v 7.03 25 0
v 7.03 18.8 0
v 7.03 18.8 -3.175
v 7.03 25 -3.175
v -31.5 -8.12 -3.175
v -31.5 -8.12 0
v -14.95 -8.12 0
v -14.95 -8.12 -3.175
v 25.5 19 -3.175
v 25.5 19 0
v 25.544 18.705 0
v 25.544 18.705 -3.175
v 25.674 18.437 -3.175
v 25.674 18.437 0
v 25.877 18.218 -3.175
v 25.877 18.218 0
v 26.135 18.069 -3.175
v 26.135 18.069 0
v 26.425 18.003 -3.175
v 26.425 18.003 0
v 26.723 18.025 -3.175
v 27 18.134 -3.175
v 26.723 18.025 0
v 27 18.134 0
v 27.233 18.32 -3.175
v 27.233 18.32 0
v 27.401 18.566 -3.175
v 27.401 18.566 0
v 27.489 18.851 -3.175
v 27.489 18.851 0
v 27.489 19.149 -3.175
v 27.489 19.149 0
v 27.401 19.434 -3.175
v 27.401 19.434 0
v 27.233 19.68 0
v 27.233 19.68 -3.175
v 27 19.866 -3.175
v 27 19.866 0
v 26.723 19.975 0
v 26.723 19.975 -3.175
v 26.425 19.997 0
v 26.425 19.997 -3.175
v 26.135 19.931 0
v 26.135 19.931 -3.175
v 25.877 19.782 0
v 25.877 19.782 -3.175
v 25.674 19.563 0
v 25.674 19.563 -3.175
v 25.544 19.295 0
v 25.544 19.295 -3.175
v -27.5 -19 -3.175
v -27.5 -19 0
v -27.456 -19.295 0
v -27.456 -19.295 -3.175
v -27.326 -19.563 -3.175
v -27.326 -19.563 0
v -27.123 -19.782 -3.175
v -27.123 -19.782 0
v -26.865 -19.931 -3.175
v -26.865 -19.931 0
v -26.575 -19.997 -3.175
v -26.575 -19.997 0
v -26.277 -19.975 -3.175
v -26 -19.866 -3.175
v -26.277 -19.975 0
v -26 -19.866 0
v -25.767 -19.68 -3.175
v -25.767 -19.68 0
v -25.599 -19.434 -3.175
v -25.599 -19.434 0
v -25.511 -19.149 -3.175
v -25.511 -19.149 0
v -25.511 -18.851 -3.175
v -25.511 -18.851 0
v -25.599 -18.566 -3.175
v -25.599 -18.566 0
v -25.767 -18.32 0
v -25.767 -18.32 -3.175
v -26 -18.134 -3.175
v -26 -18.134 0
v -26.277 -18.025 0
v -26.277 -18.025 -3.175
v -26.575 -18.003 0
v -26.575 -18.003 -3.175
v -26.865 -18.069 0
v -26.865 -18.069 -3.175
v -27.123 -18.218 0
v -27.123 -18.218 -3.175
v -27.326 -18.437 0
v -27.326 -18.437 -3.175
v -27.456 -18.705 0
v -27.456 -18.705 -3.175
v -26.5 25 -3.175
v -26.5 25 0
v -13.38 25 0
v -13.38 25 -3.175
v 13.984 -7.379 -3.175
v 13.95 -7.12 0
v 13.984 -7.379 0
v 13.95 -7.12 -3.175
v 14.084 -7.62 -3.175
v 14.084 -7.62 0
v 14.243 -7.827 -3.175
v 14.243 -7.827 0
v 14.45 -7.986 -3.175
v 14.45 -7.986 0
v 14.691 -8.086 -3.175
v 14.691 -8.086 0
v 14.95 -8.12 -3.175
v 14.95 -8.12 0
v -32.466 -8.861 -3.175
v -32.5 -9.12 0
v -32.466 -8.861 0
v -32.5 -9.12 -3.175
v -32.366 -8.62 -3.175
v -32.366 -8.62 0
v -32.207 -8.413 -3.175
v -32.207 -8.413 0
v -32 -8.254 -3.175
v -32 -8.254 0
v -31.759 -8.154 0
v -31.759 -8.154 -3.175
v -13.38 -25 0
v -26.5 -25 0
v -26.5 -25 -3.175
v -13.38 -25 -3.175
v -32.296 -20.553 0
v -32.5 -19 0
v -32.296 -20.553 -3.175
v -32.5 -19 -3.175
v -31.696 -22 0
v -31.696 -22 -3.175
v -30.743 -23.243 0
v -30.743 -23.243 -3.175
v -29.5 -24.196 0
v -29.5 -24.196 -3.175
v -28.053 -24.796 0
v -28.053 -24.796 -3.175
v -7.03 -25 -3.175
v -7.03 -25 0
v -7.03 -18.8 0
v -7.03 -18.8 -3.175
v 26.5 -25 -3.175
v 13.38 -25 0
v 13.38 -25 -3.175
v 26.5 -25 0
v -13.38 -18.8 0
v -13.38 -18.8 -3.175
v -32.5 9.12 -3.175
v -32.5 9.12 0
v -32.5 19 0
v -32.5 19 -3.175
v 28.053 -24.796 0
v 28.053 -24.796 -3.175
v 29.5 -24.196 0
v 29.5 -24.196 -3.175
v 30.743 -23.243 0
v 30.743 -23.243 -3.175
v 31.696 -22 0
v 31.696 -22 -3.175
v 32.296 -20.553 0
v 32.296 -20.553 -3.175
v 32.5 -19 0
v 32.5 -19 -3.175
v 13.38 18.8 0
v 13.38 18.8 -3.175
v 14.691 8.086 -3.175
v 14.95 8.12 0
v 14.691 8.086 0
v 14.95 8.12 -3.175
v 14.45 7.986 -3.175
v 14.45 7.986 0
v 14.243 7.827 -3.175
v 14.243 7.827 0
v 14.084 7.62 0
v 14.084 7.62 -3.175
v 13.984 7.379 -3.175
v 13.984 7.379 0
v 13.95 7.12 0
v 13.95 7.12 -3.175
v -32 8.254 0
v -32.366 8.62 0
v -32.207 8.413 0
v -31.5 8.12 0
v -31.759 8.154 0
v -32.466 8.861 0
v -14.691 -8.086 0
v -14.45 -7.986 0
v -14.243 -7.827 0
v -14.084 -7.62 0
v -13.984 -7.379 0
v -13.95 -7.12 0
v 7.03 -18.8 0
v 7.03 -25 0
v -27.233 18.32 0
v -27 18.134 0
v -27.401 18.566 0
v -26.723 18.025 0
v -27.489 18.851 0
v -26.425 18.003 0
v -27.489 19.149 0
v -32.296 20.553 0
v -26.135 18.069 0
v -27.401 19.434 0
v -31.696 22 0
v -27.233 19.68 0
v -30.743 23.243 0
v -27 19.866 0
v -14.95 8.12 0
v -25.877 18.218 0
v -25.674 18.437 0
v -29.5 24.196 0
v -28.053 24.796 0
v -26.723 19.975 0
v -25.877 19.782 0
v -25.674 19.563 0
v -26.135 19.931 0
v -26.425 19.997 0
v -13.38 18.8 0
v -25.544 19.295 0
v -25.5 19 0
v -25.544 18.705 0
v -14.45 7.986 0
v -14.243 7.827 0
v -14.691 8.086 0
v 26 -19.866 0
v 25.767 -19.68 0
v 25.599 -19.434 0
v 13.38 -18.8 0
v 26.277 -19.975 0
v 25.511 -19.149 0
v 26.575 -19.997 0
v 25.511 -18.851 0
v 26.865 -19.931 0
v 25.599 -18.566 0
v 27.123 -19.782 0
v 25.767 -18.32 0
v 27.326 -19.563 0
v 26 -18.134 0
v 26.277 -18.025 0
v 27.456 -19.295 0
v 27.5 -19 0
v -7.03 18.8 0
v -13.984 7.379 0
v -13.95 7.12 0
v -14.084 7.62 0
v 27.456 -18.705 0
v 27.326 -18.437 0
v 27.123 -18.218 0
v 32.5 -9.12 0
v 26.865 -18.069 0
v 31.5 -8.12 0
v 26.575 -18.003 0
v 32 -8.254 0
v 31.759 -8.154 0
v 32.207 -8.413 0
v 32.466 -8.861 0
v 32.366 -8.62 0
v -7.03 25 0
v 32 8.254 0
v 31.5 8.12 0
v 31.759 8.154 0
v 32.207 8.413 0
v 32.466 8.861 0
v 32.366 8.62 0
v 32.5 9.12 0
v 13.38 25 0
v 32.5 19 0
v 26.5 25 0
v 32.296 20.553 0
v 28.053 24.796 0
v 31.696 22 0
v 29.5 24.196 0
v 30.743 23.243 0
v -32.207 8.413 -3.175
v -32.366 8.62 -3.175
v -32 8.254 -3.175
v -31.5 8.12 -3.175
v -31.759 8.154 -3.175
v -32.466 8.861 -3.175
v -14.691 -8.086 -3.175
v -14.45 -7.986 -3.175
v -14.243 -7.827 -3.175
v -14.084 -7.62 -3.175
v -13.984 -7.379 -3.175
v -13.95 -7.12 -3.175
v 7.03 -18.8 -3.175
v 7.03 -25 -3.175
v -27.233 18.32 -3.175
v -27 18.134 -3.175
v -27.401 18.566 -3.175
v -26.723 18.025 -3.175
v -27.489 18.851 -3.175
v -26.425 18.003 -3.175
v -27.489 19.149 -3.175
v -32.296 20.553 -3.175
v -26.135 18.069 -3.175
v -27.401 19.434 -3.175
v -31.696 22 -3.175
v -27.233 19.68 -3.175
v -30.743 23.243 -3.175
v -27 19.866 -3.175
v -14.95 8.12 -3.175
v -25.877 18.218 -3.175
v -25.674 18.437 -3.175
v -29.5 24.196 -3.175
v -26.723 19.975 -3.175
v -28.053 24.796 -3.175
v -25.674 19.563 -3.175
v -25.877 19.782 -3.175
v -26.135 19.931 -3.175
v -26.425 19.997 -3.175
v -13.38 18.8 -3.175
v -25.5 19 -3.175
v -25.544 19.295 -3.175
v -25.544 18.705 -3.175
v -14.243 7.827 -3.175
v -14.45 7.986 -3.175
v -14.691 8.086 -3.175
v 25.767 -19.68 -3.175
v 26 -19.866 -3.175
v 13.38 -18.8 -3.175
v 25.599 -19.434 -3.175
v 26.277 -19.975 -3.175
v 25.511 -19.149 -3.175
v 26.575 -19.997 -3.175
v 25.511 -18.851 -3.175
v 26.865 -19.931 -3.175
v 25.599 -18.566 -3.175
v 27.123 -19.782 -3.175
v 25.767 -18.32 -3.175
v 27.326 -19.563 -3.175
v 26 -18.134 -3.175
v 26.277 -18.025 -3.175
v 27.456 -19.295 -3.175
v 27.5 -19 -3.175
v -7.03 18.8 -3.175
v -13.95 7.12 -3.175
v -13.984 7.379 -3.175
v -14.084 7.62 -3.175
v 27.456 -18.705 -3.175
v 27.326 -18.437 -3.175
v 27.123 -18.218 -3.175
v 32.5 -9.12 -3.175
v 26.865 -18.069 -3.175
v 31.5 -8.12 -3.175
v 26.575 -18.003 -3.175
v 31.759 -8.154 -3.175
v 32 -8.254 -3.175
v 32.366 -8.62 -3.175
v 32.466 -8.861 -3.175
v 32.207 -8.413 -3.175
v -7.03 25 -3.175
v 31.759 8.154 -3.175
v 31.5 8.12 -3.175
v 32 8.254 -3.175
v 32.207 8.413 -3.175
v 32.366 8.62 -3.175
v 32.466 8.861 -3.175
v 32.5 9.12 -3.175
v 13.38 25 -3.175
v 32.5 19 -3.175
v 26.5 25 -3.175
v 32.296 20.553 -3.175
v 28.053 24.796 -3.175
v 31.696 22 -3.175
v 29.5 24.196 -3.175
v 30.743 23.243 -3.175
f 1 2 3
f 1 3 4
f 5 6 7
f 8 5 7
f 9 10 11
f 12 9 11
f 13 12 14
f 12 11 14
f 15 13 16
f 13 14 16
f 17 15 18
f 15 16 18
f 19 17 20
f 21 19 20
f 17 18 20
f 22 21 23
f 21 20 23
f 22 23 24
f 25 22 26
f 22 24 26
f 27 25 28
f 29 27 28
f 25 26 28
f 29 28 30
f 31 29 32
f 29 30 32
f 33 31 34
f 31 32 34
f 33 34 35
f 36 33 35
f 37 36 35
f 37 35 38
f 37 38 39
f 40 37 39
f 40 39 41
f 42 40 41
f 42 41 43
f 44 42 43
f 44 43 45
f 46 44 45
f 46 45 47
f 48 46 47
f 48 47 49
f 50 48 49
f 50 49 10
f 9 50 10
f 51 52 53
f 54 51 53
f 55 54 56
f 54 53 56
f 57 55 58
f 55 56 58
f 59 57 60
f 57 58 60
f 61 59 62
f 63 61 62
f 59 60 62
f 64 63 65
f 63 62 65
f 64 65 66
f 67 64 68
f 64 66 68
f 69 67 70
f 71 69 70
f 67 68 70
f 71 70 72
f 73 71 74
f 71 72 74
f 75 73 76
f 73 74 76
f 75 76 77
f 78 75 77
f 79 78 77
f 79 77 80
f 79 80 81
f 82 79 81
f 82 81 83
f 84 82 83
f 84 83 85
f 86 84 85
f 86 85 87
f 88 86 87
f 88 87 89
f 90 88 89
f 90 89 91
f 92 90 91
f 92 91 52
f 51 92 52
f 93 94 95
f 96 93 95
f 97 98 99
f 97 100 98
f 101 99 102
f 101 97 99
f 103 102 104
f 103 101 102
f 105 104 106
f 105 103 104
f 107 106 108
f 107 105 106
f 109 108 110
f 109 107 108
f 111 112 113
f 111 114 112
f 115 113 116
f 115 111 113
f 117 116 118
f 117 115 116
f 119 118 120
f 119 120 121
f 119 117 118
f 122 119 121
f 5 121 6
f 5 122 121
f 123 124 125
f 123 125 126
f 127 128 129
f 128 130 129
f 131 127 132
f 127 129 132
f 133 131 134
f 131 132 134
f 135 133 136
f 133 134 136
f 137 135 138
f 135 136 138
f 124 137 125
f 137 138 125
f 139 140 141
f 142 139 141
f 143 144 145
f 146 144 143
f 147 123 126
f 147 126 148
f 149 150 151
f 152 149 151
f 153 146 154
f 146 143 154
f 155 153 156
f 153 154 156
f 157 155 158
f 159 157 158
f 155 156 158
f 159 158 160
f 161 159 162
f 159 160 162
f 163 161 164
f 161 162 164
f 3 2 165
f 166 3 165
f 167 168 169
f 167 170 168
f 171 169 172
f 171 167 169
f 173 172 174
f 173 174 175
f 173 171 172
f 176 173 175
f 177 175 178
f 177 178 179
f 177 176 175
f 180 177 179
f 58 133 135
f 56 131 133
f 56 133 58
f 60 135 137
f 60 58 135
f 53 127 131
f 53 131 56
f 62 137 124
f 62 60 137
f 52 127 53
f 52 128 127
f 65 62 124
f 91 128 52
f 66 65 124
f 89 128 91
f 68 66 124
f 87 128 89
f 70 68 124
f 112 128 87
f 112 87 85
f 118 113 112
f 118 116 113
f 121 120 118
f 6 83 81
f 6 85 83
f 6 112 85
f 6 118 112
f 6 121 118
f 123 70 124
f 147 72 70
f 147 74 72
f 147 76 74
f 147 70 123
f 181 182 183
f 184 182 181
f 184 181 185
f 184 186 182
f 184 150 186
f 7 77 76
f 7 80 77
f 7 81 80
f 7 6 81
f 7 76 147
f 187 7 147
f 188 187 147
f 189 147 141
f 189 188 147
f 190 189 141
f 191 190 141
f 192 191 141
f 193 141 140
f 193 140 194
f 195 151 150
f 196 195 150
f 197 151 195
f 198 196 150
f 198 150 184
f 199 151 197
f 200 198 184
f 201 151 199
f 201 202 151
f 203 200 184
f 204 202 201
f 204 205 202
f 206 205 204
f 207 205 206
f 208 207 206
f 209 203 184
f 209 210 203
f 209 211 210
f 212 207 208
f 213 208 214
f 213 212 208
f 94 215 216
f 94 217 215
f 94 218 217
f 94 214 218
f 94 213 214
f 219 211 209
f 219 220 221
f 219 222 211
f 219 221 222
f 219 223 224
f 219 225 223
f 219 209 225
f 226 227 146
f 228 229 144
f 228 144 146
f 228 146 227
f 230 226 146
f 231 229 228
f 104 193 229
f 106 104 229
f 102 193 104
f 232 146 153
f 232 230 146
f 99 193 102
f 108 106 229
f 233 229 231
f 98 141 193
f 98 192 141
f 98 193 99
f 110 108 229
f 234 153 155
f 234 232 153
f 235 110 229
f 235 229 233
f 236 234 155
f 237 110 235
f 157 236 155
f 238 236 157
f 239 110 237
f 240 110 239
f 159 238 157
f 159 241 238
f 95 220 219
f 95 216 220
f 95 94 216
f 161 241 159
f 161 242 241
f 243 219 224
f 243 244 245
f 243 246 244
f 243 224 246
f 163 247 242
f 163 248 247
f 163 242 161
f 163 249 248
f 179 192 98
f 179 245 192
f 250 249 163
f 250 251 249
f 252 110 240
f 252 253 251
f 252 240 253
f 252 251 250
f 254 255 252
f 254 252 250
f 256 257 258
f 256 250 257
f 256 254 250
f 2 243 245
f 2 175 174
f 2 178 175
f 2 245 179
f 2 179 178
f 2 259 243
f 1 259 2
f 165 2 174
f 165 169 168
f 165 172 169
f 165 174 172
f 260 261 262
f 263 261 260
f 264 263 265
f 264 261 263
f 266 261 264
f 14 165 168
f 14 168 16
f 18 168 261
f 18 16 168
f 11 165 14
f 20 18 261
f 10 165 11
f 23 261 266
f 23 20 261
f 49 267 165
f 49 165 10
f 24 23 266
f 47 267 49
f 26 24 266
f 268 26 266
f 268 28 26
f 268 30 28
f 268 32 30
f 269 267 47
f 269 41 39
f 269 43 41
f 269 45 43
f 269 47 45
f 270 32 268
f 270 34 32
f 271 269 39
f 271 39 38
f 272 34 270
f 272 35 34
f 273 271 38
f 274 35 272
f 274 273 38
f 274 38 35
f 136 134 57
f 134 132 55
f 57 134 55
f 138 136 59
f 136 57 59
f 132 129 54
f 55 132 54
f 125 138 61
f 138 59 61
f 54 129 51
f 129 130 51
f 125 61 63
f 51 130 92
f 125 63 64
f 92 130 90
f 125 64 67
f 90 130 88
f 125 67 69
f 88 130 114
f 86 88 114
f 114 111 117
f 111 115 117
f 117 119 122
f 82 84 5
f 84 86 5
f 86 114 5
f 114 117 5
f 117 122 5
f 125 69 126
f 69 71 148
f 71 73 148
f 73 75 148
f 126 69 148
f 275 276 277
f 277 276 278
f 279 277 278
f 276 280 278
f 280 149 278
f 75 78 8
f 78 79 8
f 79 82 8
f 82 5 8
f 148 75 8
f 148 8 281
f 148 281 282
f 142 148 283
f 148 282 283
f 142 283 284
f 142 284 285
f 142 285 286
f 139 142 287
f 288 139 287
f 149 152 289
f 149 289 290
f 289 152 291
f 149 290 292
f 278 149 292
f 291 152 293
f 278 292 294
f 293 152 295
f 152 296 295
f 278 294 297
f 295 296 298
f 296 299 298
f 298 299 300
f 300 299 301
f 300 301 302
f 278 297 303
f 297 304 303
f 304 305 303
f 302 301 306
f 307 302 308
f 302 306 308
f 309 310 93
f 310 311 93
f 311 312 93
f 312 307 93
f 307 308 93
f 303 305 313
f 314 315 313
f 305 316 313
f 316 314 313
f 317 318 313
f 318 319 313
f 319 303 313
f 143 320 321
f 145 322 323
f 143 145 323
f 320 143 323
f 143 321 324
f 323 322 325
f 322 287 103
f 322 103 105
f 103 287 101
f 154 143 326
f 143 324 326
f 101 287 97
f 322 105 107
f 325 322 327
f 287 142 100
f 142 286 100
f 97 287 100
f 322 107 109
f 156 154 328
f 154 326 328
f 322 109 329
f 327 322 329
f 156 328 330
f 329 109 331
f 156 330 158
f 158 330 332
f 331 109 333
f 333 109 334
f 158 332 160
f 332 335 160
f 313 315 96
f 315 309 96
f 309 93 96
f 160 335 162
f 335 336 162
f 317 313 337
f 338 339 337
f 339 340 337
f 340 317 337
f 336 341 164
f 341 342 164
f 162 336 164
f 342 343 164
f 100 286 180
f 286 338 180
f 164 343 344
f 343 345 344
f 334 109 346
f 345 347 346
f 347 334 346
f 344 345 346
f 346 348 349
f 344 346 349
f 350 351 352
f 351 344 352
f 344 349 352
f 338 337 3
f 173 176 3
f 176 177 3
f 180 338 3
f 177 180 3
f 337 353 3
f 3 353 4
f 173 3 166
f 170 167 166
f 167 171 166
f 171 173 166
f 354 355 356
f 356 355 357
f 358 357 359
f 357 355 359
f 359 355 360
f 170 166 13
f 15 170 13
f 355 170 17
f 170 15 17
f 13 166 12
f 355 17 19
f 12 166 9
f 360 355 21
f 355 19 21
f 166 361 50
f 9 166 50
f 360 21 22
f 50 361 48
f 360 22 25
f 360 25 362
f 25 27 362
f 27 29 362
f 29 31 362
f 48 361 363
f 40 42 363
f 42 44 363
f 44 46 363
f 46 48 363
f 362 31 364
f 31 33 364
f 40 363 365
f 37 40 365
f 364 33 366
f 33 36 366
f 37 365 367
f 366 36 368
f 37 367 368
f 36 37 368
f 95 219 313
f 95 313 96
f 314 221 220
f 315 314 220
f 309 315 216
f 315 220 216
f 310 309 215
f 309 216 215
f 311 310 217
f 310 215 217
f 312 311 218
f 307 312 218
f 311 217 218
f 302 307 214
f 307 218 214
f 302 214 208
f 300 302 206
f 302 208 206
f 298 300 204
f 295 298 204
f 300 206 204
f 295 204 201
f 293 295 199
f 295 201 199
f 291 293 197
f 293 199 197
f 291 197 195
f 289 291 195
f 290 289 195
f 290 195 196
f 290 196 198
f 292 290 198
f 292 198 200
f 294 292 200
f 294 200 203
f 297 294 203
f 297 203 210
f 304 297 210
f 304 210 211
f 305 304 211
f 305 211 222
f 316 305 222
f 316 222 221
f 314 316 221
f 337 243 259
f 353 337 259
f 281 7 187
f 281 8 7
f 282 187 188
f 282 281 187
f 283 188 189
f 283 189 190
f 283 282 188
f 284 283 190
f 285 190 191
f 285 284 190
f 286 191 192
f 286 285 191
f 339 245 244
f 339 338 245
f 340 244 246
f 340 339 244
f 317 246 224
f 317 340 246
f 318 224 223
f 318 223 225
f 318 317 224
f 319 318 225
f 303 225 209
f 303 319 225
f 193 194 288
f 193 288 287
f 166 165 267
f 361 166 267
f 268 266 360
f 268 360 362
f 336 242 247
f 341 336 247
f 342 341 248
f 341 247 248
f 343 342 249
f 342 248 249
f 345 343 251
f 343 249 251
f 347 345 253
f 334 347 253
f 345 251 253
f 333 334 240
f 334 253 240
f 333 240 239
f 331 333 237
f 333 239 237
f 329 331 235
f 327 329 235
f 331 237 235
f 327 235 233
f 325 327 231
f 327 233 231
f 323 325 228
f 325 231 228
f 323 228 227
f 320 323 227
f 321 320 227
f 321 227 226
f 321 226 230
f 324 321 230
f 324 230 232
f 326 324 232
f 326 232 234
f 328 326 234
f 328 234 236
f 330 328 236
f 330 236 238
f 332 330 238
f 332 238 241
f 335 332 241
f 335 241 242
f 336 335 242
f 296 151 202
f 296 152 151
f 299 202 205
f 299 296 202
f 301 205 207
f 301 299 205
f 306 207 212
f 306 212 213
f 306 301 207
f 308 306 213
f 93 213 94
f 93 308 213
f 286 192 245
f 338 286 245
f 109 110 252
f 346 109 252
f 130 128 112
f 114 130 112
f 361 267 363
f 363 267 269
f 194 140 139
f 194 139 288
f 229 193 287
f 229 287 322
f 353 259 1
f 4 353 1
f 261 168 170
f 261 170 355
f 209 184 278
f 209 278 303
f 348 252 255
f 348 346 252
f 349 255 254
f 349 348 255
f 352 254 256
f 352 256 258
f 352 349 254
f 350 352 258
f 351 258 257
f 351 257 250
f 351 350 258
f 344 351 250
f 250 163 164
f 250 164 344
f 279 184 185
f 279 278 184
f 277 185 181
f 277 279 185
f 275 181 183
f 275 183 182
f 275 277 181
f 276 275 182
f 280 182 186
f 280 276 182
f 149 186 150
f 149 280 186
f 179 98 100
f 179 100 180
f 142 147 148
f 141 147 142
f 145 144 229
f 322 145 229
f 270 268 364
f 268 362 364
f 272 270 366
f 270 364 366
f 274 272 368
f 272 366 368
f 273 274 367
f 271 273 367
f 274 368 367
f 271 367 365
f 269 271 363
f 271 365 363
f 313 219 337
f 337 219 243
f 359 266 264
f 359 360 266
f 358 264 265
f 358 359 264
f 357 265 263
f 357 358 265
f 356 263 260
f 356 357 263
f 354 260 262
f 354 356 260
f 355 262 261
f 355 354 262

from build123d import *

# Parameters (mm, degrees)
OVERALL_DIMENSIONS_W    = 65
OVERALL_DIMENSIONS_H    = 50
RECTANGULAR_PLATE_DEPTH = 3.175
EXTERNAL_4_FILLETS_R    = 6
HOLE_POSITIONS_R        = 1
CORNER_HOLES_DEPTH      = 42.125790266
RJ45_GEOMETRY_W         = 18.55
RJ45_GEOMETRY_H         = 16.24
RJ45_CUTOUTS_DEPTH      = 42.125790266
CLIP_SLOT_GEOMETRY_W    = 6.35
CLIP_SLOT_GEOMETRY_H    = 6.2
CLIP_SLOTS_DEPTH        = 42.125790266
FILLET1_R               = 1


with BuildPart() as part:
    # overall dimensions → Rectangular Plate (new body)
    with BuildSketch(Plane.XY):
        Rectangle(OVERALL_DIMENSIONS_W, OVERALL_DIMENSIONS_H)
    extrude(amount=-RECTANGULAR_PLATE_DEPTH)

    # External 4 Fillets
    external_4_fillets_edges = [part.edges().sort_by_distance(p)[0] for p in [
        (32.5, -25, -1.5875),
        (-32.5, -25, -1.5875),
        (-32.5, 25, -1.5875),
        (32.5, 25, -1.5875),
    ]]
    fillet(external_4_fillets_edges, radius=EXTERNAL_4_FILLETS_R)

    # hole positions → Corner Holes (cut, through all)
    with BuildSketch(Plane.XY):
        with Locations((-26.5, 19)):
            Circle(HOLE_POSITIONS_R)
        with Locations(Location((26.5, 19, 0), (0, 0, 180))):
            Circle(HOLE_POSITIONS_R)
        with Locations((26.5, -19)):
            Circle(HOLE_POSITIONS_R)
        with Locations(Location((-26.5, -19, 0), (0, 0, 180))):
            Circle(HOLE_POSITIONS_R)
    extrude(amount=-CORNER_HOLES_DEPTH, mode=Mode.SUBTRACT)

    # RJ45 geometry → RJ45 cutouts (cut, through all)
    with BuildSketch(Plane.XY):
        with Locations((-23.225, 0)):
            Rectangle(RJ45_GEOMETRY_W, RJ45_GEOMETRY_H)
        with Locations((23.225, 0)):
            Rectangle(RJ45_GEOMETRY_W, RJ45_GEOMETRY_H)
    extrude(amount=-RJ45_CUTOUTS_DEPTH, mode=Mode.SUBTRACT)

    # clip slot geometry → clip slots (cut, through all)
    with BuildSketch(Plane.XY):
        with Locations((10.205, 21.9)):
            Rectangle(CLIP_SLOT_GEOMETRY_W, CLIP_SLOT_GEOMETRY_H)
        with Locations((-10.205, 21.9)):
            Rectangle(CLIP_SLOT_GEOMETRY_W, CLIP_SLOT_GEOMETRY_H)
        with Locations((-10.205, -21.9)):
            Rectangle(CLIP_SLOT_GEOMETRY_W, CLIP_SLOT_GEOMETRY_H)
        with Locations((10.205, -21.9)):
            Rectangle(CLIP_SLOT_GEOMETRY_W, CLIP_SLOT_GEOMETRY_H)
    extrude(amount=-CLIP_SLOTS_DEPTH, mode=Mode.SUBTRACT)

    # Fillet1
    fillet1_edges = [part.edges().sort_by_distance(p)[0] for p in [
        (32.5, -8.12, -1.5875),
        (13.95, -8.12, -1.5875),
        (13.95, 8.12, -1.5875),
        (32.5, 8.12, -1.5875),
        (-13.95, 8.12, -1.5875),
        (-13.95, -8.12, -1.5875),
        (-32.5, -8.12, -1.5875),
        (-32.5, 8.12, -1.5875),
    ]]
    fillet(fillet1_edges, radius=FILLET1_R)


solid = part.part
